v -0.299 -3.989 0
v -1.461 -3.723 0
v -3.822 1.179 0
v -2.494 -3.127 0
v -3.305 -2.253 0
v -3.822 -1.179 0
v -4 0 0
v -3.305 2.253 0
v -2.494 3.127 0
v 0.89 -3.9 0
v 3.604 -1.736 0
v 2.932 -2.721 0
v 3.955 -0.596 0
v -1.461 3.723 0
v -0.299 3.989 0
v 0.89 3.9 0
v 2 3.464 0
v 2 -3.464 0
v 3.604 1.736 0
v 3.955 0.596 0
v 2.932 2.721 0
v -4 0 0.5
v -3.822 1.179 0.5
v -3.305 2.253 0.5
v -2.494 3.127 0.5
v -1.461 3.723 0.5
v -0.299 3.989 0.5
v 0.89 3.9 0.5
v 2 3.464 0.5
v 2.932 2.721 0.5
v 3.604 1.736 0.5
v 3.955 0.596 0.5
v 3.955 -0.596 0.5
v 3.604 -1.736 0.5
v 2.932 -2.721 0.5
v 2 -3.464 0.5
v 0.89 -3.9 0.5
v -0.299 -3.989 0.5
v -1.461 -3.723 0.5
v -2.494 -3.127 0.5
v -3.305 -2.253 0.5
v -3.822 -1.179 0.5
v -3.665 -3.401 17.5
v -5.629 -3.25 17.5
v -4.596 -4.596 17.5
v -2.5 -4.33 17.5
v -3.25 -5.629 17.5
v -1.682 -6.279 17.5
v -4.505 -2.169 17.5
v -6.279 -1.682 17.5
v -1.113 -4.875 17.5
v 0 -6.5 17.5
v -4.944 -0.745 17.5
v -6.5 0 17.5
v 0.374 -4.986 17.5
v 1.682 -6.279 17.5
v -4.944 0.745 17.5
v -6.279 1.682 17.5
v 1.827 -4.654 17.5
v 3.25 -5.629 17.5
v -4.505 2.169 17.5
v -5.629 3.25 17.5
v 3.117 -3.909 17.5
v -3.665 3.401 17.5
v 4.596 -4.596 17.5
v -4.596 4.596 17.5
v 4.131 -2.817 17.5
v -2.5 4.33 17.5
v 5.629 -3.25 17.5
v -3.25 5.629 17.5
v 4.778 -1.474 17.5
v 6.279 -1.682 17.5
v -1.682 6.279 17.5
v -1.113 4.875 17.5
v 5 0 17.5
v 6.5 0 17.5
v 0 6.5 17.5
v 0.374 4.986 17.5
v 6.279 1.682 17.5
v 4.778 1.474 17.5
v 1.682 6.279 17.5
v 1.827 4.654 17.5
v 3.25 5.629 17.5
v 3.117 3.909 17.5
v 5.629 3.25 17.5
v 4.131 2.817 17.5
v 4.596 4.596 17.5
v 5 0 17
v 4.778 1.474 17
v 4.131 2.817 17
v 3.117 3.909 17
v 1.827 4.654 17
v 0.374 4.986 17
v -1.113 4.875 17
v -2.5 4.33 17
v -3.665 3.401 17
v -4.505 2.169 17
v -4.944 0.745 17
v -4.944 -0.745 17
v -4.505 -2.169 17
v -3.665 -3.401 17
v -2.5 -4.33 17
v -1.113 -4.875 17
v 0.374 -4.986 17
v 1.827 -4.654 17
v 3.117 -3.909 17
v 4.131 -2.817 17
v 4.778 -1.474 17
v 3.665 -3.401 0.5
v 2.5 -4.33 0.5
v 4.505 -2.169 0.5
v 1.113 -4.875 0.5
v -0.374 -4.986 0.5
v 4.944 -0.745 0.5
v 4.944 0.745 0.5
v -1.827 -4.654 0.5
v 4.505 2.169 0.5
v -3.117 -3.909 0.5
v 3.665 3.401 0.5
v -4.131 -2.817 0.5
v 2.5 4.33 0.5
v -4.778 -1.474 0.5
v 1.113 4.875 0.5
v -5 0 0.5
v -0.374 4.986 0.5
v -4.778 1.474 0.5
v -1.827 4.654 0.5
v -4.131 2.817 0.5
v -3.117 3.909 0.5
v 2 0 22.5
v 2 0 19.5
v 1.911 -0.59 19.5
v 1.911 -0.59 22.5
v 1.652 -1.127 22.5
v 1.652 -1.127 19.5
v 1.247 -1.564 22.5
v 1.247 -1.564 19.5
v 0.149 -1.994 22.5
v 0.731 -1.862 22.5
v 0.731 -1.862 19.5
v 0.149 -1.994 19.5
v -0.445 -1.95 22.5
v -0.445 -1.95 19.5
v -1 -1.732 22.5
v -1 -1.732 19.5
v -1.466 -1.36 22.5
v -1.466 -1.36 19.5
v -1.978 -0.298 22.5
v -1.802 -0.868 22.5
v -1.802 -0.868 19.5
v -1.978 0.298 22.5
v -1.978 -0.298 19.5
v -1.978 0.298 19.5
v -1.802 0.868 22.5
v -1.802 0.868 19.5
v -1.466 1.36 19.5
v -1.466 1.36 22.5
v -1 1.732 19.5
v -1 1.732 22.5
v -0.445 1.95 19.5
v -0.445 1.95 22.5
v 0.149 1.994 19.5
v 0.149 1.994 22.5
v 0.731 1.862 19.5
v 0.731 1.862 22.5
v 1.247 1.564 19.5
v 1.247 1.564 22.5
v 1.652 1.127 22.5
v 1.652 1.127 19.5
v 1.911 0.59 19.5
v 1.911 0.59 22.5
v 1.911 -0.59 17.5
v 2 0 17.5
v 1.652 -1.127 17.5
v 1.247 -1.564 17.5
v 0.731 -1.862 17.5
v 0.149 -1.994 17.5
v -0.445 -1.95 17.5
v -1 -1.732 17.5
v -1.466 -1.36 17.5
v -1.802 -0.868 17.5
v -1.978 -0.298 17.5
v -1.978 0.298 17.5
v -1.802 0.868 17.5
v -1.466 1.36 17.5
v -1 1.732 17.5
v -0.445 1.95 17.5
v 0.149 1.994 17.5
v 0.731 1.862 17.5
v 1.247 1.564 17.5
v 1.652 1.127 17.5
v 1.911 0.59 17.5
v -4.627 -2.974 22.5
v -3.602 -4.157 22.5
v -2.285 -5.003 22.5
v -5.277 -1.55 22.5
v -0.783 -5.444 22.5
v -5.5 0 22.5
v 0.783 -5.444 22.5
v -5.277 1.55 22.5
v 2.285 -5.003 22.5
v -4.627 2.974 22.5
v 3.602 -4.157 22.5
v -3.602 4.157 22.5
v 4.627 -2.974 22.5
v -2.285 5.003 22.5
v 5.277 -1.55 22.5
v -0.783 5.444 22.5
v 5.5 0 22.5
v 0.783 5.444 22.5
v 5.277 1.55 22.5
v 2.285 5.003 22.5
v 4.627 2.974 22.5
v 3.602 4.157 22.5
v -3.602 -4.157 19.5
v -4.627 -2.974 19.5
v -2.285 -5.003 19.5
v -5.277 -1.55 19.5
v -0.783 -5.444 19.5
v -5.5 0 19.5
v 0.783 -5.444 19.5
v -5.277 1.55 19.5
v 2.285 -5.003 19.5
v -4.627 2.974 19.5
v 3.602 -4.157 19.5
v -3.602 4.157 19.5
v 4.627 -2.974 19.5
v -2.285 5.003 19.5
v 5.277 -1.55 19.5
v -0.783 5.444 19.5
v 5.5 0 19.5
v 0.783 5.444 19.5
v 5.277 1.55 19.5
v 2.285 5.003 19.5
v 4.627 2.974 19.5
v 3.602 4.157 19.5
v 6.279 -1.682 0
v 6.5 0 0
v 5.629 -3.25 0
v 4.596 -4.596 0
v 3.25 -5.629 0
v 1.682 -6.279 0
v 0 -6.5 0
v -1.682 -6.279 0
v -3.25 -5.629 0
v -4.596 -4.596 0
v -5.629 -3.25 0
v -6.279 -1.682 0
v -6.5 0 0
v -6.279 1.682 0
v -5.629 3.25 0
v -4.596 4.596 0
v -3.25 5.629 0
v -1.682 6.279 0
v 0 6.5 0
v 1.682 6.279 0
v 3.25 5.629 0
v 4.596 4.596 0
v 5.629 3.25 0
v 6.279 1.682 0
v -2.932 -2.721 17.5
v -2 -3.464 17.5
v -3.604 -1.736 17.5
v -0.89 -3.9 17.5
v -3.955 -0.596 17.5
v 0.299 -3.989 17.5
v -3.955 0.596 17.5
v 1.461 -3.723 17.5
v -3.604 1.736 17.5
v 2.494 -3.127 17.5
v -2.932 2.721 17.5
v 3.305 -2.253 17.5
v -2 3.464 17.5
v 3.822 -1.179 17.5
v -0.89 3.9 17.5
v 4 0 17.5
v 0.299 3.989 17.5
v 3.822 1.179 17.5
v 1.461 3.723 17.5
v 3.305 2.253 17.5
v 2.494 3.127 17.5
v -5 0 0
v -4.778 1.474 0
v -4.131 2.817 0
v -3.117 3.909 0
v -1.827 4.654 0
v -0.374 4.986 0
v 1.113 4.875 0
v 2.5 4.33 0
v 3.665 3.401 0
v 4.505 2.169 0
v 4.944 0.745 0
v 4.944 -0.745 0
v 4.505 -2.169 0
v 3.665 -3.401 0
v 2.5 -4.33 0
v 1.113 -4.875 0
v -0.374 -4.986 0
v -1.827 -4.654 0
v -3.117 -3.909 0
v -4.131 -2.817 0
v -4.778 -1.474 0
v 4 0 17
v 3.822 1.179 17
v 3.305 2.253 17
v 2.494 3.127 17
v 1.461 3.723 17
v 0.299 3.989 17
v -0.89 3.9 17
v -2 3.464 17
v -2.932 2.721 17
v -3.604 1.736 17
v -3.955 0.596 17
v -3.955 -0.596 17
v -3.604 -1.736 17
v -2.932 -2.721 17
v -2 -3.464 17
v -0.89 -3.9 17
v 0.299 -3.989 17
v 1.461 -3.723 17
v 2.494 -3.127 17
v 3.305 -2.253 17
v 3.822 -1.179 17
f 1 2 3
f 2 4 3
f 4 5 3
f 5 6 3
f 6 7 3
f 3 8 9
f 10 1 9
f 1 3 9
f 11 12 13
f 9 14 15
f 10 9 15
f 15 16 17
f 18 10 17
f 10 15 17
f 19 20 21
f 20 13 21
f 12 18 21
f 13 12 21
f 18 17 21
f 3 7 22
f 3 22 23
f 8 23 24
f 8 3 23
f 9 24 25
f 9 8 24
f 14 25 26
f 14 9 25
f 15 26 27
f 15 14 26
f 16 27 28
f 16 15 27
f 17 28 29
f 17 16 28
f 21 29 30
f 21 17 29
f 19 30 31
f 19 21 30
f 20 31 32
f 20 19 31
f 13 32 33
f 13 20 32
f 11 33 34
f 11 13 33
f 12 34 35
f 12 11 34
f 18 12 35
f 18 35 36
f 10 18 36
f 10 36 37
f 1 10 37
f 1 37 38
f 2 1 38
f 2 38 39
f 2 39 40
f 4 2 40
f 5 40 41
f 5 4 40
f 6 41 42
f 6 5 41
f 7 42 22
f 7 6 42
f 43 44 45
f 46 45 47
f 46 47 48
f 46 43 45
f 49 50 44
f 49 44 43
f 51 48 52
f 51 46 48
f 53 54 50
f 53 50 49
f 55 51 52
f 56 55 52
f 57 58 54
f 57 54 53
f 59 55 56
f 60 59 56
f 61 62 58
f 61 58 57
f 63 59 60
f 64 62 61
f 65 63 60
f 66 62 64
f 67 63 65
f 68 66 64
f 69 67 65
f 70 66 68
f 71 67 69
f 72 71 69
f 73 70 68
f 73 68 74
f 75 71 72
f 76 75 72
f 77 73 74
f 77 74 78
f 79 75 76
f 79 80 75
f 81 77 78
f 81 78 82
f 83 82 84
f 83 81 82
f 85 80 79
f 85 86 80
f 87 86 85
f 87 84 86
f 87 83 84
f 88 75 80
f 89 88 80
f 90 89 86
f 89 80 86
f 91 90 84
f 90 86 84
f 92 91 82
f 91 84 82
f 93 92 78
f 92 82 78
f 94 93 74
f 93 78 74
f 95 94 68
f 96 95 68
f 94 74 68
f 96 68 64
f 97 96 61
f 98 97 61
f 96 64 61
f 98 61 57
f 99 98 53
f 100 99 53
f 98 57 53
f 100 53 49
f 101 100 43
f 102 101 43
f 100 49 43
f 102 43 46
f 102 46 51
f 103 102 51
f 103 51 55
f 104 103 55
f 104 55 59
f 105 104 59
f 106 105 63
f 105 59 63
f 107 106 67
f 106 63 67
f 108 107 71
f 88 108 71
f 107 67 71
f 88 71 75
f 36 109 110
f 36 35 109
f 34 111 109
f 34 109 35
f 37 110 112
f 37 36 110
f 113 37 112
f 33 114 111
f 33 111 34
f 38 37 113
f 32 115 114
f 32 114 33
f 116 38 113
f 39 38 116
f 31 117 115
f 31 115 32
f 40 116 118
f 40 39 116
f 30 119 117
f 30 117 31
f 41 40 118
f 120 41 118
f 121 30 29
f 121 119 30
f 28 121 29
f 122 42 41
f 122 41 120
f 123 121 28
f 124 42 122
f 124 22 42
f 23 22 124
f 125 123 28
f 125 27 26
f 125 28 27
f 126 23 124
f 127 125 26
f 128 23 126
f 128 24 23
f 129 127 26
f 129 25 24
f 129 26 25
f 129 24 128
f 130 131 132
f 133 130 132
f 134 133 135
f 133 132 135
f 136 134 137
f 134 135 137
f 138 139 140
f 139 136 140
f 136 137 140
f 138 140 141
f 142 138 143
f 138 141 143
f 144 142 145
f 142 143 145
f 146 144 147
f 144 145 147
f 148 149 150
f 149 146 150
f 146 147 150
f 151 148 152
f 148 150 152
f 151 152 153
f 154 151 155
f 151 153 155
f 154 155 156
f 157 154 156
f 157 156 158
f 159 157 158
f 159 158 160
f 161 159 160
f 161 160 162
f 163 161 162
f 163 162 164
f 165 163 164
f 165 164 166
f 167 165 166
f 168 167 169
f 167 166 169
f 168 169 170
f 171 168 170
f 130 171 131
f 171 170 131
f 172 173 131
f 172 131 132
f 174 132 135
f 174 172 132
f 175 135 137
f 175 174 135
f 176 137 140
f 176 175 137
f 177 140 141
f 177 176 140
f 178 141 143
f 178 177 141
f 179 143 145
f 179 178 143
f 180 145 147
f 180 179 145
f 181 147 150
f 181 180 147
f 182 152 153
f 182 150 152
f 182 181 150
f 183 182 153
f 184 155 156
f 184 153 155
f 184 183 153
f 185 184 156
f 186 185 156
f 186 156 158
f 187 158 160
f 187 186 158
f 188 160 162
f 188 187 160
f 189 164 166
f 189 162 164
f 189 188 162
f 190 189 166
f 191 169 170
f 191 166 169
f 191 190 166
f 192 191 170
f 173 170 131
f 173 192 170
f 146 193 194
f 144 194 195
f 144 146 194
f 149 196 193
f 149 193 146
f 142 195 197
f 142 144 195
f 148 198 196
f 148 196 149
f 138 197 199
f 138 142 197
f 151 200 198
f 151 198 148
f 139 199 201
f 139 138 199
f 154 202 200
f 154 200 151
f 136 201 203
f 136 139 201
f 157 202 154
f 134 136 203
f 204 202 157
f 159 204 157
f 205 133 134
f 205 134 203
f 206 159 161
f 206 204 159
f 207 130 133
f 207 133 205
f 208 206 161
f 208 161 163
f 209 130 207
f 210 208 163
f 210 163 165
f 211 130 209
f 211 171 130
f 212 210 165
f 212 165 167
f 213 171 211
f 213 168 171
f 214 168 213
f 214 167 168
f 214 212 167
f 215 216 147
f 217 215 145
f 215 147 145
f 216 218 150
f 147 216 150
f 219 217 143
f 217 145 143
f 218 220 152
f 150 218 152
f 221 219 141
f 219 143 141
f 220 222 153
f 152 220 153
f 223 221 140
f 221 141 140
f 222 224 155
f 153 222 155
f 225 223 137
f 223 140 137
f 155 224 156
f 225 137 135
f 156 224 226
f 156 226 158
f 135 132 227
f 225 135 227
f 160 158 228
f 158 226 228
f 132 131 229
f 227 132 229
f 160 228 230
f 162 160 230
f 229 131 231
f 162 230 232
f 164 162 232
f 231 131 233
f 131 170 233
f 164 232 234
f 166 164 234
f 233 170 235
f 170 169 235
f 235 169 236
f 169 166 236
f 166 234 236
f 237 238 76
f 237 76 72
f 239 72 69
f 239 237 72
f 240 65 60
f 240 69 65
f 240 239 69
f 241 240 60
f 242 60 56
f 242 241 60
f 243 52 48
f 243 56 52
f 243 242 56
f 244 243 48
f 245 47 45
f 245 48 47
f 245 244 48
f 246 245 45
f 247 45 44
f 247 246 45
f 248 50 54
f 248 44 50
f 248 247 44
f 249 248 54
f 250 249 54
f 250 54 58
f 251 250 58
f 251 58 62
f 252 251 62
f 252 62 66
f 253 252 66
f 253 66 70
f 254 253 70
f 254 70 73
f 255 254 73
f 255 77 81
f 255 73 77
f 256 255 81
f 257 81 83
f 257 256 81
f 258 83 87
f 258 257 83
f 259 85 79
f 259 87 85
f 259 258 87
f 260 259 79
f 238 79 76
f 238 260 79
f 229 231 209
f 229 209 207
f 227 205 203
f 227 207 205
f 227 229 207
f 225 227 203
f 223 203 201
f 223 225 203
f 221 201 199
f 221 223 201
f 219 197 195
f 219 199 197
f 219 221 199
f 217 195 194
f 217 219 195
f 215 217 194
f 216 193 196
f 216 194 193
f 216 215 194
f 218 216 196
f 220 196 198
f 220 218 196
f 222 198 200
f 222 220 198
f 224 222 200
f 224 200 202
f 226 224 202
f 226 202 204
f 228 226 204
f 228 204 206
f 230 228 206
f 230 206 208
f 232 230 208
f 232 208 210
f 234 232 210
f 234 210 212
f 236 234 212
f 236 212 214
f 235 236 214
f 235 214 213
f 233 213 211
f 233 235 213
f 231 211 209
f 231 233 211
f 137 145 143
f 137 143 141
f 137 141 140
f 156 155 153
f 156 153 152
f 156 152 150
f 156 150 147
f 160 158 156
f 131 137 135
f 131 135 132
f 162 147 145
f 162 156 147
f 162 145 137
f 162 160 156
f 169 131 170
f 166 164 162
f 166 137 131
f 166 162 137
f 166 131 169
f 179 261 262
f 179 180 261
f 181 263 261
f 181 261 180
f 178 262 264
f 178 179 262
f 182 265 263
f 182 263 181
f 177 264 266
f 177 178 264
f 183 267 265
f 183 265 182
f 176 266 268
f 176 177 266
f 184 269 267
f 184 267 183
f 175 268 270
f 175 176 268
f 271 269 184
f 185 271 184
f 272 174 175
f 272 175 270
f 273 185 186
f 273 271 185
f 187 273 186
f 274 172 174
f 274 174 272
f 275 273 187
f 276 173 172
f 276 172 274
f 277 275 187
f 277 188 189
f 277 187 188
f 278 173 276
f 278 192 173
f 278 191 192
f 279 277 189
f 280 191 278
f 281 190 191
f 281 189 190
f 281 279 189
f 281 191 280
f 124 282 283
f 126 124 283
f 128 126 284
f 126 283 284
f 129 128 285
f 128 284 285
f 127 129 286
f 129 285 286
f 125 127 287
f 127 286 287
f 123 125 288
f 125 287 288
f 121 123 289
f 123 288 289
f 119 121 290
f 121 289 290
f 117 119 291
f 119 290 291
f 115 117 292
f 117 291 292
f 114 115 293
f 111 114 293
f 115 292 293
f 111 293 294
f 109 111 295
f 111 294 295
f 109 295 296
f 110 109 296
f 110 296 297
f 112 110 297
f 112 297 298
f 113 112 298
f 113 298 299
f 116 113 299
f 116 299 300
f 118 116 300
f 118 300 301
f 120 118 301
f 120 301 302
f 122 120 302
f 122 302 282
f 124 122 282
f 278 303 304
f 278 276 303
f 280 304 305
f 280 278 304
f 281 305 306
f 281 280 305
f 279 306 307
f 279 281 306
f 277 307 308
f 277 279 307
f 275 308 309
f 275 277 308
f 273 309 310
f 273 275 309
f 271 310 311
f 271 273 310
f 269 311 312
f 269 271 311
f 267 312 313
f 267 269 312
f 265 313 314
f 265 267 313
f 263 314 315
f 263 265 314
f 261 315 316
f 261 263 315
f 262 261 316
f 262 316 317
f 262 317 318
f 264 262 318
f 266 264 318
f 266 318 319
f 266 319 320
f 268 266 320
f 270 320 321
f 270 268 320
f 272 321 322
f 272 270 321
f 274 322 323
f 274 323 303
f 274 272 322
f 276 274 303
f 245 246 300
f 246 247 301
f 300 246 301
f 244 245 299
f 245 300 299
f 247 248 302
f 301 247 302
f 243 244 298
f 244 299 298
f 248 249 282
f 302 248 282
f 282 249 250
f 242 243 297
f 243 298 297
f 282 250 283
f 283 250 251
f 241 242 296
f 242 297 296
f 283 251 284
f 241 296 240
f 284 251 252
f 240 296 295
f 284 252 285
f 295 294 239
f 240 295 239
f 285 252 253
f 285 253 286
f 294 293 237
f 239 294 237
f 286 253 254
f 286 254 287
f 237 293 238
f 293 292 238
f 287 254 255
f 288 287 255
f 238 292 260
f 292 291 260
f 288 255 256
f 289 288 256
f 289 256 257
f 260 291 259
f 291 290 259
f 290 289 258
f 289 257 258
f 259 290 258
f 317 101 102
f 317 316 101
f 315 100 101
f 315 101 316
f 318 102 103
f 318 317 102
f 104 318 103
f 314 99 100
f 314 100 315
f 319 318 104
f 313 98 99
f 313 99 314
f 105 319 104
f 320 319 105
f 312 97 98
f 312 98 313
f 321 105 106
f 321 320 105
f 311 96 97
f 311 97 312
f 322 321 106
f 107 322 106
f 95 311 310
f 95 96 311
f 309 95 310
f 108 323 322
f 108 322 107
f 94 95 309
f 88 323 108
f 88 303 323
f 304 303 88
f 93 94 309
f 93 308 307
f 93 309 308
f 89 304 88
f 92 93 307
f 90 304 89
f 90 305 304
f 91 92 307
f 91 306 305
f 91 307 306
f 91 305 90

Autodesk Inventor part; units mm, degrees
ref_plane "YZ Plane" through (0, 0, 0) normal (1, 0, 0) x (0, 1, 0)
ref_plane "XZ Plane" through (0, 0, 0) normal (0, 1, 0) x (-1, 0, 0)
ref_plane "XY Plane" through (0, 0, 0) normal (0, 0, 1) x (1, 0, 0)
sketch "Sketch1" plane through (0, 0, 0) normal (0, 0, 1) x (1, 0, 0)
  circle A0 centre (0, 0) radius 6.5
  dimension "d0" = 13
extrude "Extrusion1" add sketch "Sketch1" along normal blind 17.5
sketch "Sketch2" plane through (0, 0, 17.5) normal (0, 0, 1) x (1, 0, 0)
  circle A0 centre (0, 0) radius 6.5 projected
  circle A1 centre (0, 0) radius 5
  circle A2 centre (0, 0) radius 4
  dimension "d3" = 10
  dimension "d4" = 8
extrude "Extrusion2" cut sketch "Sketch2" against normal blind 0.5 contours A1
sketch "Sketch3" plane through (0, 0, 0) normal (0, 0, -1) x (-1, 0, 0)
  circle A0 centre (0, 0) radius 6.5 projected
  circle A1 centre (0, 0) radius 5
  circle A2 centre (0, 0) radius 4
  dimension "d7" = 10
  dimension "d8" = 8
extrude "Extrusion3" cut sketch "Sketch3" against normal blind 0.5 contours A1
sketch "Sketch4" plane through (0, 0, 17.5) normal (0, 0, 1) x (1, 0, 0)
  circle A0 centre (0, 0) radius 4 projected
  circle A1 centre (0, 0) radius 2
  dimension "d11" = 4
extrude "Extrusion4" add sketch "Sketch4" along normal blind 2 contours A1
sketch "Sketch5" plane through (0, 0, 19.5) normal (0, 0, 1) x (1, 0, 0)
  circle A0 centre (0, 0) radius 2 projected
  circle A1 centre (0, 0) radius 5.5
  dimension "d14" = 11
extrude "Extrusion5" add sketch "Sketch5" along normal blind 3
properties part number "bearing"
